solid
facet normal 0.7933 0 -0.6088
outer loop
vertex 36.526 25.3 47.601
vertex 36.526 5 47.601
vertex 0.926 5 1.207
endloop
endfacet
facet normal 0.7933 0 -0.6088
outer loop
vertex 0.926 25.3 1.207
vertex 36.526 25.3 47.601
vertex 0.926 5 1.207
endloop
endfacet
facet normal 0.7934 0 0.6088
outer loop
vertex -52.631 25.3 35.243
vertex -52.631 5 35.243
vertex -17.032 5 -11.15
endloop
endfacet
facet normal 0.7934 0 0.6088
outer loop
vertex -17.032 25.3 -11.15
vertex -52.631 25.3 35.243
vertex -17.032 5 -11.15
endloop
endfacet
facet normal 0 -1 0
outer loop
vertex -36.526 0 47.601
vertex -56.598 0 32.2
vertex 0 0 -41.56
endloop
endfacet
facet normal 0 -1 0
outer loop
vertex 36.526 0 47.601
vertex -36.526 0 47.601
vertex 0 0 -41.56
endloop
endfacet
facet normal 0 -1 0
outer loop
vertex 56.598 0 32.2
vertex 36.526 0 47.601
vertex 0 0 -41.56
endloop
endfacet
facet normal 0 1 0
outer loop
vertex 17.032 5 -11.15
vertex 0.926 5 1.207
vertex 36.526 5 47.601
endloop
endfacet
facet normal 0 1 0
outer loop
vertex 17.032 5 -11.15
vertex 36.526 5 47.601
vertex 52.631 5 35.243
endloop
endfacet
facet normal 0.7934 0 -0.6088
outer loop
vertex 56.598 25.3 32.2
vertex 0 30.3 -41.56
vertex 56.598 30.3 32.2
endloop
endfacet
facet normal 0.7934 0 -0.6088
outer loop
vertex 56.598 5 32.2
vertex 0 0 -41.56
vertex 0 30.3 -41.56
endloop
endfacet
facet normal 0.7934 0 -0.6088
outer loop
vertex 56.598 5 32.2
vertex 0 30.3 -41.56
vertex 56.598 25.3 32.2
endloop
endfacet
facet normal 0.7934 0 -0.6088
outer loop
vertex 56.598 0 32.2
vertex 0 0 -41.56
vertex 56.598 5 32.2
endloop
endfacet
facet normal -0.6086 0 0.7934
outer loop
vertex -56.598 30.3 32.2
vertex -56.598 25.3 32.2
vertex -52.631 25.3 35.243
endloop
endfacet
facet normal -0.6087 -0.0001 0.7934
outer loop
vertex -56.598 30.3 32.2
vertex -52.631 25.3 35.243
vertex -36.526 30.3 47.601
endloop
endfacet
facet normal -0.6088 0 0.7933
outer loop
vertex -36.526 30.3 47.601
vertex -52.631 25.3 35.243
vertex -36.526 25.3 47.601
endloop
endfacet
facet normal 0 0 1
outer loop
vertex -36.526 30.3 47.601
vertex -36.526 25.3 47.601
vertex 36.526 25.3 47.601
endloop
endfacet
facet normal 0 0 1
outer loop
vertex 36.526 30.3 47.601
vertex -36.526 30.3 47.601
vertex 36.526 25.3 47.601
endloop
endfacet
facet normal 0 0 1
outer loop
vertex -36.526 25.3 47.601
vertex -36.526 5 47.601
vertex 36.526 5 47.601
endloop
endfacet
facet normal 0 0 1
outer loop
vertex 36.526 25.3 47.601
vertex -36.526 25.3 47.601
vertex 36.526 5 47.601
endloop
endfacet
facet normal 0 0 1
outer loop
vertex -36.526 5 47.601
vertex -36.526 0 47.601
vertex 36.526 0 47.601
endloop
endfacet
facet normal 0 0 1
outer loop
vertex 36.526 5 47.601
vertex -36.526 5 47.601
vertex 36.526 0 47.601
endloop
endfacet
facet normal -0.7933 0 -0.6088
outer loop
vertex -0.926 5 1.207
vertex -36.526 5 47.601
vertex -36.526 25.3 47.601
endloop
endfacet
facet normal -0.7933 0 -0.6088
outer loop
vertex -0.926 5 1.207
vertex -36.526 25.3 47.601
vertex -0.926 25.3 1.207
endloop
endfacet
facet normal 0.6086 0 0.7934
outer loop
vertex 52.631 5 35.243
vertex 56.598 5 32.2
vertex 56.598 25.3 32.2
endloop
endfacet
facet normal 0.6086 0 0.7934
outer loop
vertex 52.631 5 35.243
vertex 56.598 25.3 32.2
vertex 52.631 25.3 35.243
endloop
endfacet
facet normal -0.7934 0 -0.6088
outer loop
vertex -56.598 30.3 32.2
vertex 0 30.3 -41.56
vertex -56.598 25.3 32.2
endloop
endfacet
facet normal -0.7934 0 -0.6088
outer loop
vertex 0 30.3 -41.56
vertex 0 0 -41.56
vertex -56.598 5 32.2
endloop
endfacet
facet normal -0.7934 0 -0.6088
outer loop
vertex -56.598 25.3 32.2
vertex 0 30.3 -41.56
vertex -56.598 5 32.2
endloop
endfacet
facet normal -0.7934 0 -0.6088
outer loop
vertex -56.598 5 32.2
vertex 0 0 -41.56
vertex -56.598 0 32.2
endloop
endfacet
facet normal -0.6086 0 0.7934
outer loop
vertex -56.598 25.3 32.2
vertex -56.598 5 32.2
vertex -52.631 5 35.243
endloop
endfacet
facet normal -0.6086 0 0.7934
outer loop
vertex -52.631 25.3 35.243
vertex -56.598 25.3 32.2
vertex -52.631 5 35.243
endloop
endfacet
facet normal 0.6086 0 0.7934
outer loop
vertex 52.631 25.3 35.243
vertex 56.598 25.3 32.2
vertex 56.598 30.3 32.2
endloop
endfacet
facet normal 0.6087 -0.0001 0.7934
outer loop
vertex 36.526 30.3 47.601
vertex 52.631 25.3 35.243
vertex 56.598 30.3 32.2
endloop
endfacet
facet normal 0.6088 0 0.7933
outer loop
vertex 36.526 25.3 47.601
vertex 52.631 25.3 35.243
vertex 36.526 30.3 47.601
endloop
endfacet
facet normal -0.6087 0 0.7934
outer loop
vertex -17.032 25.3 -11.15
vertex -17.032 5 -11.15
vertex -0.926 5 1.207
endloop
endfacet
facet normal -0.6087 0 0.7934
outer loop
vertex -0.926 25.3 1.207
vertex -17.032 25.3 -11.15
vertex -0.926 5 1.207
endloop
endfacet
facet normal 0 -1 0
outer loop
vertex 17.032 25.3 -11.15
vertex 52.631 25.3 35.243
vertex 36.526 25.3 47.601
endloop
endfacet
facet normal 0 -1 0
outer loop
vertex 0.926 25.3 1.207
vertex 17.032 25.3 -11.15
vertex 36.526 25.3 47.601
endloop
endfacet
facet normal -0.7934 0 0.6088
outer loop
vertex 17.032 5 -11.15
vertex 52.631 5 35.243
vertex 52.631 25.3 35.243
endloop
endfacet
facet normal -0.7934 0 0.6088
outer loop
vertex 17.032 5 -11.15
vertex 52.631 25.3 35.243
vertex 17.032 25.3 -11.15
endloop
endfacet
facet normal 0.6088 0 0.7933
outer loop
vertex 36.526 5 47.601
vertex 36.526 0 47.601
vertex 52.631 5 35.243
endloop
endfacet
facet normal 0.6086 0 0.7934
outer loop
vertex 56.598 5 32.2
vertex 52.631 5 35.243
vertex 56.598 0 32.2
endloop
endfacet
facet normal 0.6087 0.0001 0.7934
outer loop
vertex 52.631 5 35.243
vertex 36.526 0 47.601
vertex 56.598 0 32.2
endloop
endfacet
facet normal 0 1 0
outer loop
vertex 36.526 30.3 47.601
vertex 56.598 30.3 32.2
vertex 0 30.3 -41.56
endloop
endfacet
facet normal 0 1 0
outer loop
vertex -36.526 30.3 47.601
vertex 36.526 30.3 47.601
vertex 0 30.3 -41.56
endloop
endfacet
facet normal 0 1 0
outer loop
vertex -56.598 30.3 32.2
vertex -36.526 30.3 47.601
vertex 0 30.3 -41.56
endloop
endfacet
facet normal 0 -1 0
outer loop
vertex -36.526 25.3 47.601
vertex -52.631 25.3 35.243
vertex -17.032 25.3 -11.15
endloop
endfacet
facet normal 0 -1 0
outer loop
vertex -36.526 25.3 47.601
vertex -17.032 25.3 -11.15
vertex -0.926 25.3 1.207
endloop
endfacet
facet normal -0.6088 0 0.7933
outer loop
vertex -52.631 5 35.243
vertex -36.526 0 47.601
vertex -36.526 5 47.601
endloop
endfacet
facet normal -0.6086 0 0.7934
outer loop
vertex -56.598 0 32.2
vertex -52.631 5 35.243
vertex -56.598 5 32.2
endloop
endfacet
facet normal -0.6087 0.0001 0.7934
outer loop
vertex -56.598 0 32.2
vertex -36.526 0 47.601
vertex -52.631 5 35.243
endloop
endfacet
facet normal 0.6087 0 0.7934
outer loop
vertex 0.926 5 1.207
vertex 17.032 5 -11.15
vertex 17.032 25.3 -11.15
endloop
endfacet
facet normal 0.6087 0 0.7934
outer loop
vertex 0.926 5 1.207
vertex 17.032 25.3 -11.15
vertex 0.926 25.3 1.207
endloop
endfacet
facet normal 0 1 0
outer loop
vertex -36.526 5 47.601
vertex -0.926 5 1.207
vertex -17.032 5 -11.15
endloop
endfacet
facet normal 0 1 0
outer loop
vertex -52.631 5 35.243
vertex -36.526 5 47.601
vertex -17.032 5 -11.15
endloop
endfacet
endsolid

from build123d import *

# Parameters (mm, degrees)
BOSS_EXTRUDE1_DEPTH = 5
BOSS_EXTRUDE2_DEPTH = 20.3
BOSS_EXTRUDE3_DEPTH = 5
BOSS_EXTRUDE4_DEPTH = 20.3
BOSS_EXTRUDE5_DEPTH = 20.3


with BuildPart() as part:
    # Sketch2 → Boss-Extrude1 (new body)
    with BuildSketch(Plane(origin=(0, 0, 0), x_dir=(1, 0, 0), z_dir=(0, 1, 0))):
        Polygon((-56.59752525, -32.199536264), (0, 41.559794682), (0, -47.601200417), (-36.525685741, -47.601200417), align=None)
    boss_extrude1 = extrude(amount=BOSS_EXTRUDE1_DEPTH)

    # Sketch4 → Boss-Extrude2 (add)
    with BuildSketch(Plane(origin=(0, 5, 0), x_dir=(1, 0, 0), z_dir=(0, 1, 0))):
        Polygon((-56.59752525, -32.199536264), (-52.630758548, -35.243343409), (0, 33.346396524), (0, 41.559794682), align=None)
    boss_extrude2 = extrude(amount=BOSS_EXTRUDE2_DEPTH)

    # Sketch5 → Boss-Extrude3 (add)
    with BuildSketch(Plane(origin=(0, 25.3, 0), x_dir=(1, 0, 0), z_dir=(0, 1, 0))):
        Polygon((-56.59752525, -32.199536264), (-36.525685741, -47.601200417), (0, -47.601200417), (0, 41.559794682), align=None)
    boss_extrude3 = extrude(amount=BOSS_EXTRUDE3_DEPTH)

    # Sketch6 → Boss-Extrude4 (add)
    with BuildSketch(Plane(origin=(0, 5, 0), x_dir=(1, 0, 0), z_dir=(0, 1, 0))):
        Polygon((-17.031549002, 11.150449726), (0, -1.91831747), (0, 33.346396524), align=None)
    boss_extrude4 = extrude(amount=BOSS_EXTRUDE4_DEPTH)

    # Sketch7 → Boss-Extrude5 (add)
    with BuildSketch(Plane(origin=(0, 5, 0), x_dir=(1, 0, 0), z_dir=(0, 1, 0))):
        Polygon((-36.525685741, -47.601200417), (-0.926476194, -1.207407283), (0, -1.91831747), (0, -47.601200417), align=None)
    boss_extrude5 = extrude(amount=BOSS_EXTRUDE5_DEPTH)

    # Mirror2: Boss-Extrude1, Boss-Extrude2, Boss-Extrude3, Boss-Extrude4, Boss-Extrude5 across plane
    add(boss_extrude1.mirror(Plane(origin=(0, 5, -41.559794682), x_dir=(0, 0, 1), z_dir=(-1, 0, 0))))
    add(boss_extrude2.mirror(Plane(origin=(0, 5, -41.559794682), x_dir=(0, 0, 1), z_dir=(-1, 0, 0))))
    add(boss_extrude3.mirror(Plane(origin=(0, 5, -41.559794682), x_dir=(0, 0, 1), z_dir=(-1, 0, 0))))
    add(boss_extrude4.mirror(Plane(origin=(0, 5, -41.559794682), x_dir=(0, 0, 1), z_dir=(-1, 0, 0))))
    add(boss_extrude5.mirror(Plane(origin=(0, 5, -41.559794682), x_dir=(0, 0, 1), z_dir=(-1, 0, 0))))


solid = part.part
